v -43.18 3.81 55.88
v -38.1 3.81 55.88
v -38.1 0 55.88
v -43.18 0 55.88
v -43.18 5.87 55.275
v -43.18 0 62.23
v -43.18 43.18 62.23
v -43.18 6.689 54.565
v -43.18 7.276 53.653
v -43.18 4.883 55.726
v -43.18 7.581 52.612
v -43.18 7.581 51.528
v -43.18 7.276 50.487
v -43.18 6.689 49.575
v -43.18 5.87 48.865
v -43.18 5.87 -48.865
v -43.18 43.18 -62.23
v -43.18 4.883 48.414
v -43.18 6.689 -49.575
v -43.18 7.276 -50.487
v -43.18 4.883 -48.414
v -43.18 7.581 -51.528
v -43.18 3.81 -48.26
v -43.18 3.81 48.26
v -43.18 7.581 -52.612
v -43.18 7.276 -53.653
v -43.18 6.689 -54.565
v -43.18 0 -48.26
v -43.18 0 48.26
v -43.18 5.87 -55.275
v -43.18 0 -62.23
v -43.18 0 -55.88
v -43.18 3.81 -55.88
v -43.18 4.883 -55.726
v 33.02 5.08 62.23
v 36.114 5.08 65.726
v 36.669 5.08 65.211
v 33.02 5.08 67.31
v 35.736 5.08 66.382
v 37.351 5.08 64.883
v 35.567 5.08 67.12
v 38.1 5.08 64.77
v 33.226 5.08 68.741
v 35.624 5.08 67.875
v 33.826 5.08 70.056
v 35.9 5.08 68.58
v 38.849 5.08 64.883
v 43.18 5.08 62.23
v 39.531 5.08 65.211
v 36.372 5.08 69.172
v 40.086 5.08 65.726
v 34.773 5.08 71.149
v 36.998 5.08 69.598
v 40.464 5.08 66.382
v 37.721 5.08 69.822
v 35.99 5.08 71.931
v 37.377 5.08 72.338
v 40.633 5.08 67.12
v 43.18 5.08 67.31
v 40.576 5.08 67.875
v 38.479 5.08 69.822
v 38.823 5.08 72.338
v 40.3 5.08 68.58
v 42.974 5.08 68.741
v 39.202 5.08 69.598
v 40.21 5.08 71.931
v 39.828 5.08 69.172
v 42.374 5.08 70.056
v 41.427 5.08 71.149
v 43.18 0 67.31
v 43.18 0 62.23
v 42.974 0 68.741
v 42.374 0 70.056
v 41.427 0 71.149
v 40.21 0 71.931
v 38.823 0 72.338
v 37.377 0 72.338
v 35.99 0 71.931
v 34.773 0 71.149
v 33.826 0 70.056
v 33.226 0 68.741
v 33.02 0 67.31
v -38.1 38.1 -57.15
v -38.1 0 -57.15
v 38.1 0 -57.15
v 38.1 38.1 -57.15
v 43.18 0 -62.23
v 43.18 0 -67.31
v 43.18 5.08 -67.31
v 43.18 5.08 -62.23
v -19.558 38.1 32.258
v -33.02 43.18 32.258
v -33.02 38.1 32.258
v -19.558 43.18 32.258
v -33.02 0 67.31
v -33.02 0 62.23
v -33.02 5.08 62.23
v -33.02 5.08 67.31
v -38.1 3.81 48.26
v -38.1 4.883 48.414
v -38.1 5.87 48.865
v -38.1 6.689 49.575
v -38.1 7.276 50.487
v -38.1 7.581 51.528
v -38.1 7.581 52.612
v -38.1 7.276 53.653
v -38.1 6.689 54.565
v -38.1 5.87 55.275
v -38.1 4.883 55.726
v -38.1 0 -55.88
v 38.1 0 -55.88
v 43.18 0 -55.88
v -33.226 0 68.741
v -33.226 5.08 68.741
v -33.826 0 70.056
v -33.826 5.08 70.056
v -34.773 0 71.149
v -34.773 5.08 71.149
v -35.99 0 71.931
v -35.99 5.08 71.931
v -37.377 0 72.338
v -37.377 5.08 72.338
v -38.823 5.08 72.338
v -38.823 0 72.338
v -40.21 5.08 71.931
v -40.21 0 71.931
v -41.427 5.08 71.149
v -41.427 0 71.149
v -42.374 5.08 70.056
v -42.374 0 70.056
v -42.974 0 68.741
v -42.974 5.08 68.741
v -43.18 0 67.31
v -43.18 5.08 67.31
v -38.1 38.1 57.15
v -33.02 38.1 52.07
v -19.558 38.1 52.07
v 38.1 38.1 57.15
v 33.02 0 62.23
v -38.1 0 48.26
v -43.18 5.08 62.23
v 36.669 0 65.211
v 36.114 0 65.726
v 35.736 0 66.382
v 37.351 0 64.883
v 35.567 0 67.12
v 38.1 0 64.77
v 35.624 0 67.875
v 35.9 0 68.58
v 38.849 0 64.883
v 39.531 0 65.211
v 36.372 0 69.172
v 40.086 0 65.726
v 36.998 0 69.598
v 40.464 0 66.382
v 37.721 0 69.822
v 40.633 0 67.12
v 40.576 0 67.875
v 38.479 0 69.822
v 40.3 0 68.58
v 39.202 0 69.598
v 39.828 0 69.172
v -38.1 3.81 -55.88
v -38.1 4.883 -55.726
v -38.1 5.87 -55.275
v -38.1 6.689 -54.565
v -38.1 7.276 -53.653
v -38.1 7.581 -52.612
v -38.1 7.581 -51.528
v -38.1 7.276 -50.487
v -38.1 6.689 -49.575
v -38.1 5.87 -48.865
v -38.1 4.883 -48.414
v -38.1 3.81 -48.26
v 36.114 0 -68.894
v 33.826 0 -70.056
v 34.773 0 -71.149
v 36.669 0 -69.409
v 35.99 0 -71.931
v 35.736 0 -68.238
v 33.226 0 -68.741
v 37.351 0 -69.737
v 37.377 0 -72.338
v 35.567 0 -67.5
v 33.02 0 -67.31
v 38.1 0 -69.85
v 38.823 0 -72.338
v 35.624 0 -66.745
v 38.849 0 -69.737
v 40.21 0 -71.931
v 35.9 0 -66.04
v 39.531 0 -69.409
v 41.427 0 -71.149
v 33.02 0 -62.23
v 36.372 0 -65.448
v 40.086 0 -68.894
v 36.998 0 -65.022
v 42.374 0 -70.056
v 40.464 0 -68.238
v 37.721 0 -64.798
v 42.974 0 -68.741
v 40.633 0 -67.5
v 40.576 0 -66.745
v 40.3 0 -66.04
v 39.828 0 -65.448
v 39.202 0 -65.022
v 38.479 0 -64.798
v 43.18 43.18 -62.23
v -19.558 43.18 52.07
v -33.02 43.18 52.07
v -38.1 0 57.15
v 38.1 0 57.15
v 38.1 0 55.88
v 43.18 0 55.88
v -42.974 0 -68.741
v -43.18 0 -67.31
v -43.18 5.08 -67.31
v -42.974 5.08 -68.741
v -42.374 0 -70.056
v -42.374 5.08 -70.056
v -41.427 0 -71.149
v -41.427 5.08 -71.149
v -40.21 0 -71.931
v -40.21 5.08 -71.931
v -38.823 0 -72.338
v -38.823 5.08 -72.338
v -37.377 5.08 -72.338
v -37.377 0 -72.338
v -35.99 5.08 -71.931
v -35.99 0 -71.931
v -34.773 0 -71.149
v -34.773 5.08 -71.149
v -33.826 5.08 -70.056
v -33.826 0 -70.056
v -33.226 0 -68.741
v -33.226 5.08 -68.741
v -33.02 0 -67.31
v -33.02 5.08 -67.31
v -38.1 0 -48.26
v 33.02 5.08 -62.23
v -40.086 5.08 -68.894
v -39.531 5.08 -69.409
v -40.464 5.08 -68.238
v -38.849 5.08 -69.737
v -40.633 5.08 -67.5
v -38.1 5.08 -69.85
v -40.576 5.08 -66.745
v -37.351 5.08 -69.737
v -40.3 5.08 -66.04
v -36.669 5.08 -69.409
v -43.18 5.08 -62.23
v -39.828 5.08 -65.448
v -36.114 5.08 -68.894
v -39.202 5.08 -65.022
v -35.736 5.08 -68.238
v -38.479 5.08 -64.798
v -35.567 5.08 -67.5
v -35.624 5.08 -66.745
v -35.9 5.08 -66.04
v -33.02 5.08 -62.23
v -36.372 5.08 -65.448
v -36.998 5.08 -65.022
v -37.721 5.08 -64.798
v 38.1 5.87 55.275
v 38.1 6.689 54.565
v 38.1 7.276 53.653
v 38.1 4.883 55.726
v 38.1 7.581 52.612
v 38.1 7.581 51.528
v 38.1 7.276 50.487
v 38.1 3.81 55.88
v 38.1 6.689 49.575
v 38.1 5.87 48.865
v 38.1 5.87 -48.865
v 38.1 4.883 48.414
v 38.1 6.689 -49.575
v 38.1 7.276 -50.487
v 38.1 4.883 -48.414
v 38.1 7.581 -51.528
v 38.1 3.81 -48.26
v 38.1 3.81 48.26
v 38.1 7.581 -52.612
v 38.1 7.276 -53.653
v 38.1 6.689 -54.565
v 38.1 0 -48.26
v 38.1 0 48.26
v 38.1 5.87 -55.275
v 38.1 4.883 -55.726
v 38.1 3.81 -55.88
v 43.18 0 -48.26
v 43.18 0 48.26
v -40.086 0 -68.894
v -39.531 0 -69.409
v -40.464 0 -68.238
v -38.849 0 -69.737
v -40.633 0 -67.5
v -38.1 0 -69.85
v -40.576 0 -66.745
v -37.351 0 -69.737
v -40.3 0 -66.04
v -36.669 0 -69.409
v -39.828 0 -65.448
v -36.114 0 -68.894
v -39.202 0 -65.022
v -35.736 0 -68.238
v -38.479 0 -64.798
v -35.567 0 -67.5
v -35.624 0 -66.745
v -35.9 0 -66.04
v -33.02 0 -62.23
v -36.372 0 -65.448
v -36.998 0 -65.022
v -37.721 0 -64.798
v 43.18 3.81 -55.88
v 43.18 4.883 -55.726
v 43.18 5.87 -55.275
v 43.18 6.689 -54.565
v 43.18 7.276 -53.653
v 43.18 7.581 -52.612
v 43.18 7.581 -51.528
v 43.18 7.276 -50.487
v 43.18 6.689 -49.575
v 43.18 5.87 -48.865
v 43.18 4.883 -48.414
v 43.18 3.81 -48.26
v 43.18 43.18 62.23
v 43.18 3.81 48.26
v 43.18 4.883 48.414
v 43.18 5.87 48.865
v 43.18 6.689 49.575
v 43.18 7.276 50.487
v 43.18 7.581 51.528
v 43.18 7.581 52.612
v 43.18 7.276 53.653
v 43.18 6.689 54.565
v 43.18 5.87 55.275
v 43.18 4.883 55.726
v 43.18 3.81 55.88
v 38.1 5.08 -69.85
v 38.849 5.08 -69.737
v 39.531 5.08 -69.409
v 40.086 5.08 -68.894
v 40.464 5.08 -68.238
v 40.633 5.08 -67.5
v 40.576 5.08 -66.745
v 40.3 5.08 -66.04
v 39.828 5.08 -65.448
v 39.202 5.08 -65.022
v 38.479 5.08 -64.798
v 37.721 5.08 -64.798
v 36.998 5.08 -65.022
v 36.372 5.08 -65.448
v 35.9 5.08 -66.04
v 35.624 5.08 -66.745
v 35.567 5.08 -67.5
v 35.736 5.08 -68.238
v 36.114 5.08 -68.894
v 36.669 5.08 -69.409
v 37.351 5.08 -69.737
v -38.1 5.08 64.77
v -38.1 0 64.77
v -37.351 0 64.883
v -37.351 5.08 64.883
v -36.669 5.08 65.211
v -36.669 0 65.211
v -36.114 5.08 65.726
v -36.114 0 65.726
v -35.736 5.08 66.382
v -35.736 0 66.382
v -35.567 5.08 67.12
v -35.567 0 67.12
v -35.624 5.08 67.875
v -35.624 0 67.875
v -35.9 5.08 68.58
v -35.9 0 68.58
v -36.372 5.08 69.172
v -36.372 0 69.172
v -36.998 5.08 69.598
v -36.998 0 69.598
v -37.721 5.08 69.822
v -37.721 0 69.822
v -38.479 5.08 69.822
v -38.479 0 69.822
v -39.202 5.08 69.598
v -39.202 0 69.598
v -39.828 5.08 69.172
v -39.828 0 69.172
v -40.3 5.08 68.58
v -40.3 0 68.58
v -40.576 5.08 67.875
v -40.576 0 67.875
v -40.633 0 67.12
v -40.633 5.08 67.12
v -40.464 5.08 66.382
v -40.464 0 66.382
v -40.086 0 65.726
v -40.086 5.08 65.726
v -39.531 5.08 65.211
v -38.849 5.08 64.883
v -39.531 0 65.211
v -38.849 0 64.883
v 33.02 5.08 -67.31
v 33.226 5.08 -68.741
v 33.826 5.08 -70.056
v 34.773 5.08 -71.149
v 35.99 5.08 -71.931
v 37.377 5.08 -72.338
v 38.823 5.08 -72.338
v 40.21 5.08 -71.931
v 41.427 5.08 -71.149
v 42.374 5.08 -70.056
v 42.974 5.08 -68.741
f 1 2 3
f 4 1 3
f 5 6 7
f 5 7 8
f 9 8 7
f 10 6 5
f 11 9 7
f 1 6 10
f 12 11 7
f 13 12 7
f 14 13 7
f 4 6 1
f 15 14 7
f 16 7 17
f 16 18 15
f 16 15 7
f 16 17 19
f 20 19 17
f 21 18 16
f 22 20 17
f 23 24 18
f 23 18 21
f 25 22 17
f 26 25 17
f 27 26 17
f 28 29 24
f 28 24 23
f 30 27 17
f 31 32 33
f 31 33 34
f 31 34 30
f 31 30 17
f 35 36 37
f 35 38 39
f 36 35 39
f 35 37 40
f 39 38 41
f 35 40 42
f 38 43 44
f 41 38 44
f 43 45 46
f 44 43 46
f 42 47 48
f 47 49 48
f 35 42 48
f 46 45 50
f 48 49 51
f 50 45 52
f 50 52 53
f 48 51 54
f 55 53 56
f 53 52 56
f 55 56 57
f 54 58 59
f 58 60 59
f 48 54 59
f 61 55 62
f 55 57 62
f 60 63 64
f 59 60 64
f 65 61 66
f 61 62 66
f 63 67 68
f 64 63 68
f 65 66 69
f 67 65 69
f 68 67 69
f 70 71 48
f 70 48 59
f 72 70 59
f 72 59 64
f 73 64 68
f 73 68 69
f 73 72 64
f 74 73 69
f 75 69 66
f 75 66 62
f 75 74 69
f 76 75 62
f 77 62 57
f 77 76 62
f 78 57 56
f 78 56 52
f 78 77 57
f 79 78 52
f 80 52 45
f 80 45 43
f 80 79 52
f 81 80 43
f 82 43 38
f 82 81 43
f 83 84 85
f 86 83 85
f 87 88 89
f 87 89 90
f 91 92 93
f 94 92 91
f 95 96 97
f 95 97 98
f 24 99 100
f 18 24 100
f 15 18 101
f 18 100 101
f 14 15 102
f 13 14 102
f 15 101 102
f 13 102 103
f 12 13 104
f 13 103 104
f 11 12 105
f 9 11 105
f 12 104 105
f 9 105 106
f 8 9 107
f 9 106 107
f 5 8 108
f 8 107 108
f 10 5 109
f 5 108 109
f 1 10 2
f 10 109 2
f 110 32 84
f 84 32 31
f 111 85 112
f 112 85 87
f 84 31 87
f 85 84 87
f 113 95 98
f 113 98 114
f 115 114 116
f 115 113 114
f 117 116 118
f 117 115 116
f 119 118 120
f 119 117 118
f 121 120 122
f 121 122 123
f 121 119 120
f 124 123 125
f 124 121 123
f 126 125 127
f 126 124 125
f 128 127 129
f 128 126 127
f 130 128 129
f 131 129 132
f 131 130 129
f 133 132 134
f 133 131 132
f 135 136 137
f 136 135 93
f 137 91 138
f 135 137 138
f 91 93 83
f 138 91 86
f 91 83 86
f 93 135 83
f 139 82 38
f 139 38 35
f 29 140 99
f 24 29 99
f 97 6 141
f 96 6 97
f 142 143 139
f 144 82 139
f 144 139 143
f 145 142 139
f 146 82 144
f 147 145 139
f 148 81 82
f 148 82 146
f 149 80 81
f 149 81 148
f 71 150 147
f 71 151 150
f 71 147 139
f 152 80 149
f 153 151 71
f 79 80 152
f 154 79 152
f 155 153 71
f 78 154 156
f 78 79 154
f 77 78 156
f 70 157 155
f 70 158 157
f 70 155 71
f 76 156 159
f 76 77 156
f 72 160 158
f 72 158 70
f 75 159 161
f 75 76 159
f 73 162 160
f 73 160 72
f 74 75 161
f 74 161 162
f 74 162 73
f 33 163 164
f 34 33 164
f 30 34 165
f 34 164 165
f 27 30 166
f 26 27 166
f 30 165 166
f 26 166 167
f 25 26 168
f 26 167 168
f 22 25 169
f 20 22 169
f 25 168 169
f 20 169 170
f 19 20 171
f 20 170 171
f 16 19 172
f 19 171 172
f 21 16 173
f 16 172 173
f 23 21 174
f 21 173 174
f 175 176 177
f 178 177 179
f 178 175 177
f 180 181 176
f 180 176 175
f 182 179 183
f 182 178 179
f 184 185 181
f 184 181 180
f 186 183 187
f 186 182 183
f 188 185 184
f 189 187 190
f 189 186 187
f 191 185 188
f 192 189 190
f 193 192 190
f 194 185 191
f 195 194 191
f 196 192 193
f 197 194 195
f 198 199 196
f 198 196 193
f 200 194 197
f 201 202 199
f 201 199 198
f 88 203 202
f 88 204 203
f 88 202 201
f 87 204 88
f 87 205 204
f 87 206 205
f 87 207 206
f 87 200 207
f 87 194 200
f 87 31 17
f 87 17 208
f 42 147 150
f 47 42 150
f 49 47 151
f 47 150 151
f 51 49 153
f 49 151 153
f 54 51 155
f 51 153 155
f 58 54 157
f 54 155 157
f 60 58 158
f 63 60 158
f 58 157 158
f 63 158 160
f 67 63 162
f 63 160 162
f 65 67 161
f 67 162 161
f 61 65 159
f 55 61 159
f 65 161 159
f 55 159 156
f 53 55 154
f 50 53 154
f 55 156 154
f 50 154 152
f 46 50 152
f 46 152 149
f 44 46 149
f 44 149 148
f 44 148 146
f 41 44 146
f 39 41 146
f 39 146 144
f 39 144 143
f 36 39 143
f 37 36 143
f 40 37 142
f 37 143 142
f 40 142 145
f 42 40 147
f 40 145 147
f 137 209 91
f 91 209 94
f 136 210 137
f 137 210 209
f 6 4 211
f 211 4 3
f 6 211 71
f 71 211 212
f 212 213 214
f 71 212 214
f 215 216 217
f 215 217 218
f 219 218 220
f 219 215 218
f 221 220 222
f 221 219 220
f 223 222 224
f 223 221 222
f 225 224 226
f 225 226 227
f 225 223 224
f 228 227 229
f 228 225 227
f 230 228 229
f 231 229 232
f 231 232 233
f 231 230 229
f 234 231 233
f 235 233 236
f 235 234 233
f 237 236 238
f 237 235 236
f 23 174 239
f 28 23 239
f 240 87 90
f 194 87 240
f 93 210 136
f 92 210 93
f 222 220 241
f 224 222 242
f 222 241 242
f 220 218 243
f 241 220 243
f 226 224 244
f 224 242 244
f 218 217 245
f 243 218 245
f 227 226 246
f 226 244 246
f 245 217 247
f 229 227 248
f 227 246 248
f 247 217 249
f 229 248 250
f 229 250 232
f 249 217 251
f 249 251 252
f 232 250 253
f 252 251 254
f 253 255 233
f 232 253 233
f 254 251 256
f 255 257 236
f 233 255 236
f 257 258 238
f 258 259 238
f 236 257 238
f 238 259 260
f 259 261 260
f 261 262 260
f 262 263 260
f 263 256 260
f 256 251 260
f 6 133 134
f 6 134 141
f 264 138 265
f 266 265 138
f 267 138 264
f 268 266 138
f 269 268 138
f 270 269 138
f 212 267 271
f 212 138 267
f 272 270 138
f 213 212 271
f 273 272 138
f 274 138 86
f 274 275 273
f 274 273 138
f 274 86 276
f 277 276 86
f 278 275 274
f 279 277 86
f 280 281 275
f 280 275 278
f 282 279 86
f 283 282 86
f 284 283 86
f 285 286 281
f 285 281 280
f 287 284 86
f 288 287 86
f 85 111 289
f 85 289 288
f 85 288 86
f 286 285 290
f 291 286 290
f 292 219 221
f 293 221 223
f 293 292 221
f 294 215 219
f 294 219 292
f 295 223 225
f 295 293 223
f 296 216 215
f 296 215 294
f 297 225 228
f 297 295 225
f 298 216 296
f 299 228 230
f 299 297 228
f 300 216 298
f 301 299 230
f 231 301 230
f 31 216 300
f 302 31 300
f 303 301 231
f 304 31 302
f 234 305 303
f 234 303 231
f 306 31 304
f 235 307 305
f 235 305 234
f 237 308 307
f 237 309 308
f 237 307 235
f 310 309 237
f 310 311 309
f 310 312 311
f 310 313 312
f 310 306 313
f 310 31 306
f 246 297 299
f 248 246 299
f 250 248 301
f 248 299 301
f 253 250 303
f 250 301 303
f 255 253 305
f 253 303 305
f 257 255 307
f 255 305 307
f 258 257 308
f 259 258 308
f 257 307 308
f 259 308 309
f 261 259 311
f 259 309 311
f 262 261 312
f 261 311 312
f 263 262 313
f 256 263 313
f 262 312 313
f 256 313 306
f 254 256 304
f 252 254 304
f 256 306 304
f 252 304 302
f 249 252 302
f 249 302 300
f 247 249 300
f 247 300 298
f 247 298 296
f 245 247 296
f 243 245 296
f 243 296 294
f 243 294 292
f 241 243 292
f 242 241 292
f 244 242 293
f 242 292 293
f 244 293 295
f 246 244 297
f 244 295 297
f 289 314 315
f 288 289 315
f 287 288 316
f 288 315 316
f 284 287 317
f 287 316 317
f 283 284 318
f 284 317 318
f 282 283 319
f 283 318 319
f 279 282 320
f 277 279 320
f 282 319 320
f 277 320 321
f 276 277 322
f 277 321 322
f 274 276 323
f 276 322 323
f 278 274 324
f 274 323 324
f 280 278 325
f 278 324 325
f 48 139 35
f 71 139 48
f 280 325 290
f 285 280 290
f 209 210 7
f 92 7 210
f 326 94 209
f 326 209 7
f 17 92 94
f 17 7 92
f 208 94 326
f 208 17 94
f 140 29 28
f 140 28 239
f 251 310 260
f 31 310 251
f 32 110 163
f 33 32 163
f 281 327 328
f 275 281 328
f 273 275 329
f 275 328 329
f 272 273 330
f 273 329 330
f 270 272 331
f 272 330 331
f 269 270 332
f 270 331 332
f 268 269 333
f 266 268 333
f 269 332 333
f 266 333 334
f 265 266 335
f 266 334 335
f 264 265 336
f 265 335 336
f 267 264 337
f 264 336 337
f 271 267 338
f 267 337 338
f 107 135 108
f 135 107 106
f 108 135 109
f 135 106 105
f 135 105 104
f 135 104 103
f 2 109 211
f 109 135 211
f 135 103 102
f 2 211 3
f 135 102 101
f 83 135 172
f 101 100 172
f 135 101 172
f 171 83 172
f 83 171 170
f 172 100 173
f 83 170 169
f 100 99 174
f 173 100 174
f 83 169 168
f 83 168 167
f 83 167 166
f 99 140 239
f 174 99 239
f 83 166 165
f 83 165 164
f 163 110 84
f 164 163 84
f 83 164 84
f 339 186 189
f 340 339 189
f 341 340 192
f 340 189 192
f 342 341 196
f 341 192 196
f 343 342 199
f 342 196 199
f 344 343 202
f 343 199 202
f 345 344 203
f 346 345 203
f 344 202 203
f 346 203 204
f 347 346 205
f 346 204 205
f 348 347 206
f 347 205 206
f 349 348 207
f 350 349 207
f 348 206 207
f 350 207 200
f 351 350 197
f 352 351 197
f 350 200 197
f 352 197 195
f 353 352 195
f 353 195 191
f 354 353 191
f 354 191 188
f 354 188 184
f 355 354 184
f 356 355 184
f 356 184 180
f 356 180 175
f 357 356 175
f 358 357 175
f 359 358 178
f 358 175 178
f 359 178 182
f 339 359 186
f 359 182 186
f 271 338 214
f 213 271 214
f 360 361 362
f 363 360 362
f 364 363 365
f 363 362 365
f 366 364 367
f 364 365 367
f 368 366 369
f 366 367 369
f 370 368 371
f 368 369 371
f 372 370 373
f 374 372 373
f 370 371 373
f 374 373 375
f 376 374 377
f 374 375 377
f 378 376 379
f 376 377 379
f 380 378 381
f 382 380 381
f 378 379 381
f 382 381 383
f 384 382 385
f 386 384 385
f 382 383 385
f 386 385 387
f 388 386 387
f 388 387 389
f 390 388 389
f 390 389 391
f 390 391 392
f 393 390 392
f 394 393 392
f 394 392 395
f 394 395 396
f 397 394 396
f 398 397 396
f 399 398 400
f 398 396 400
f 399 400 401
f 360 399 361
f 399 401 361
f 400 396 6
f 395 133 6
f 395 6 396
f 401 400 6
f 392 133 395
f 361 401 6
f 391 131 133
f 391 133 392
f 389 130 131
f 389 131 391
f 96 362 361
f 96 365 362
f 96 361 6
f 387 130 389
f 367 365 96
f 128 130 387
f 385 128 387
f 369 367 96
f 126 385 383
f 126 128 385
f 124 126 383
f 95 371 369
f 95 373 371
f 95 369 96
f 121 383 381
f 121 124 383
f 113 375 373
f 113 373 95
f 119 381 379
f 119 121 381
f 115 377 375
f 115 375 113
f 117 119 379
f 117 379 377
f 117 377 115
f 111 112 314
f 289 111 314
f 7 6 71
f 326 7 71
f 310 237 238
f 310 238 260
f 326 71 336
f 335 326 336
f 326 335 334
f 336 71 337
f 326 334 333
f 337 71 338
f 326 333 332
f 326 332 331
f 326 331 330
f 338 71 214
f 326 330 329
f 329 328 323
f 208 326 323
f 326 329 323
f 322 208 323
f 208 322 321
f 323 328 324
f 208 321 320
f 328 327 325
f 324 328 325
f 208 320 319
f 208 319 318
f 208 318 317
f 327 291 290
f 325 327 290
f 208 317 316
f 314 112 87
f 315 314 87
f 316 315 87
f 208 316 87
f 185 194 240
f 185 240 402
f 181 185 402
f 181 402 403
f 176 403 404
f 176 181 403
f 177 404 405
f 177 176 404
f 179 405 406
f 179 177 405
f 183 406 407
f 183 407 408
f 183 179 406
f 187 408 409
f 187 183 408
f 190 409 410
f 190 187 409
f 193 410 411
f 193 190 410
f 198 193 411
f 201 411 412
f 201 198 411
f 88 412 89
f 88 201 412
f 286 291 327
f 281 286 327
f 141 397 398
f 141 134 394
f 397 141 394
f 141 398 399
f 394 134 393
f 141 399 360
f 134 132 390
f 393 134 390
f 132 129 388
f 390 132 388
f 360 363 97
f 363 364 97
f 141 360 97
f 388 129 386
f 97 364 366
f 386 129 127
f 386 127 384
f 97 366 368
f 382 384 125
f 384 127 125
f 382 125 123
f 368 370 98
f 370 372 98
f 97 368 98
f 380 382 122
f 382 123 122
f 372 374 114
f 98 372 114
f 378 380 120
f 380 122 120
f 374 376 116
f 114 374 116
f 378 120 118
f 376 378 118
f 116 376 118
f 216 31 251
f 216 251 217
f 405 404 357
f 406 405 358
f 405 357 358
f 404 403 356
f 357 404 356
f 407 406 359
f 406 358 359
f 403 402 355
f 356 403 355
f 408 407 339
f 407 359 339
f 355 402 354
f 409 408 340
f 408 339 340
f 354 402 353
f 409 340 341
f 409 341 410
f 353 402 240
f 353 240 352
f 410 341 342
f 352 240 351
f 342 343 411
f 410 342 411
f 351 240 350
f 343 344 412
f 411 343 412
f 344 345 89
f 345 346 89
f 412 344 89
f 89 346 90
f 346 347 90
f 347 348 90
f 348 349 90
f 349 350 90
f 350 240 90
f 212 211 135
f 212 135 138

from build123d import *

# Parameters (mm, degrees)
SKETCH1_W           = 76.2
SKETCH1_H           = 114.3
BOSS_EXTRUDE1_DEPTH = 38.1
SHELL1_T            = 5.08
SKETCH2_R           = 5.08
SKETCH2_R_2         = 2.54
BOSS_EXTRUDE2_DEPTH = 5.08
CUT_EXTRUDE1_DEPTH  = 121.67673388
SKETCH4_W           = 13.462
SKETCH4_H           = 19.812
CUT_EXTRUDE2_DEPTH  = 95.706583193


with BuildPart() as part:
    # Sketch1 → Boss-Extrude1 (new body)
    with BuildSketch(Plane(origin=(0, 0, 0), x_dir=(1, 0, 0), z_dir=(0, 1, 0))):
        Rectangle(SKETCH1_W, SKETCH1_H)
    extrude(amount=BOSS_EXTRUDE1_DEPTH)

    # Shell1
    shell1_openings = [part.faces().sort_by_distance(p)[0] for p in [
        (0, 0, 0),
    ]]
    offset(amount=SHELL1_T, openings=shell1_openings, kind=Kind.INTERSECTION)

    # Sketch3 → Cut-Extrude1 (cut, through all)
    with BuildSketch(Plane(origin=(43.18, 0, 0), x_dir=(0, 0, -1), z_dir=(1, 0, 0))):
        with BuildLine():
            Line((-55.88, 3.81), (-55.88, 0))
            Line((-55.88, 0), (-48.26, 0))
            Line((-48.26, 0), (-48.26, 3.81))
            ThreePointArc((-48.26, 3.81), (-52.07, 7.62), (-55.88, 3.81))
        make_face()
        with BuildLine():
            Line((48.26, 3.81), (48.26, 0))
            Line((48.26, 0), (55.88, 0))
            Line((55.88, 0), (55.88, 3.81))
            ThreePointArc((55.88, 3.81), (52.07, 7.62), (48.26, 3.81))
        make_face()
    extrude(amount=-CUT_EXTRUDE1_DEPTH, mode=Mode.SUBTRACT)

    # Sketch4 → Cut-Extrude2 (cut, through all)
    with BuildSketch(Plane(origin=(0, 43.18, 0), x_dir=(1, 0, 0), z_dir=(0, 1, 0))):
        with Locations((-26.289, -42.164)):
            Rectangle(SKETCH4_W, SKETCH4_H)
    extrude(amount=-CUT_EXTRUDE2_DEPTH, mode=Mode.SUBTRACT)


with BuildPart() as body_2:
    # Sketch2 → Boss-Extrude2 (new body)
    with BuildSketch(Plane.XZ):
        with Locations((-38.1, 67.31)):
            Circle(SKETCH2_R)
        with Locations(Location((-38.1, 67.31, 0), (0, 0, 270))):
            Circle(SKETCH2_R_2, mode=Mode.SUBTRACT)
        with BuildLine():
            Line((-33.02, 62.23), (-33.02, 67.31))
            ThreePointArc((-33.02, 67.31), (-34.507897552, 63.717897552), (-38.1, 62.23))
            Line((-38.1, 62.23), (-33.02, 62.23))
        make_face()
        with BuildLine():
            ThreePointArc((-38.1, 62.23), (-41.692102448, 63.717897552), (-43.18, 67.31))
            Line((-43.18, 67.31), (-43.18, 62.23))
            Line((-43.18, 62.23), (-38.1, 62.23))
        make_face()
        with Locations((38.1, 67.31)):
            Circle(SKETCH2_R)
        with Locations(Location((38.1, 67.31, 0), (0, 0, 270))):
            Circle(SKETCH2_R_2, mode=Mode.SUBTRACT)
        with BuildLine():
            Line((33.02, 67.31), (33.02, 62.23))
            Line((33.02, 62.23), (38.1, 62.23))
            ThreePointArc((38.1, 62.23), (34.507897552, 63.717897552), (33.02, 67.31))
        make_face()
        with BuildLine():
            ThreePointArc((43.18, 67.31), (41.692102448, 63.717897552), (38.1, 62.23))
            Line((38.1, 62.23), (43.18, 62.23))
            Line((43.18, 62.23), (43.18, 67.31))
        make_face()
        with Locations((38.1, -67.31)):
            Circle(SKETCH2_R)
        with Locations(Location((38.1, -67.31, 0), (0, 0, 270))):
            Circle(SKETCH2_R_2, mode=Mode.SUBTRACT)
        with BuildLine():
            Line((33.02, -62.23), (33.02, -67.31))
            ThreePointArc((33.02, -67.31), (34.507897552, -63.717897552), (38.1, -62.23))
            Line((38.1, -62.23), (33.02, -62.23))
        make_face()
        with BuildLine():
            ThreePointArc((38.1, -62.23), (41.692102448, -63.717897552), (43.18, -67.31))
            Line((43.18, -67.31), (43.18, -62.23))
            Line((43.18, -62.23), (38.1, -62.23))
        make_face()
        with Locations((-38.1, -67.31)):
            Circle(SKETCH2_R)
        with Locations(Location((-38.1, -67.31, 0), (0, 0, 270))):
            Circle(SKETCH2_R_2, mode=Mode.SUBTRACT)
        with BuildLine():
            Line((-33.02, -67.31), (-33.02, -62.23))
            Line((-33.02, -62.23), (-38.1, -62.23))
            ThreePointArc((-38.1, -62.23), (-34.507897552, -63.717897552), (-33.02, -67.31))
        make_face()
        with BuildLine():
            ThreePointArc((-43.18, -67.31), (-41.692102448, -63.717897552), (-38.1, -62.23))
            Line((-38.1, -62.23), (-43.18, -62.23))
            Line((-43.18, -62.23), (-43.18, -67.31))
        make_face()
    extrude(amount=-BOSS_EXTRUDE2_DEPTH)


solid = Compound([part.part, body_2.part])
